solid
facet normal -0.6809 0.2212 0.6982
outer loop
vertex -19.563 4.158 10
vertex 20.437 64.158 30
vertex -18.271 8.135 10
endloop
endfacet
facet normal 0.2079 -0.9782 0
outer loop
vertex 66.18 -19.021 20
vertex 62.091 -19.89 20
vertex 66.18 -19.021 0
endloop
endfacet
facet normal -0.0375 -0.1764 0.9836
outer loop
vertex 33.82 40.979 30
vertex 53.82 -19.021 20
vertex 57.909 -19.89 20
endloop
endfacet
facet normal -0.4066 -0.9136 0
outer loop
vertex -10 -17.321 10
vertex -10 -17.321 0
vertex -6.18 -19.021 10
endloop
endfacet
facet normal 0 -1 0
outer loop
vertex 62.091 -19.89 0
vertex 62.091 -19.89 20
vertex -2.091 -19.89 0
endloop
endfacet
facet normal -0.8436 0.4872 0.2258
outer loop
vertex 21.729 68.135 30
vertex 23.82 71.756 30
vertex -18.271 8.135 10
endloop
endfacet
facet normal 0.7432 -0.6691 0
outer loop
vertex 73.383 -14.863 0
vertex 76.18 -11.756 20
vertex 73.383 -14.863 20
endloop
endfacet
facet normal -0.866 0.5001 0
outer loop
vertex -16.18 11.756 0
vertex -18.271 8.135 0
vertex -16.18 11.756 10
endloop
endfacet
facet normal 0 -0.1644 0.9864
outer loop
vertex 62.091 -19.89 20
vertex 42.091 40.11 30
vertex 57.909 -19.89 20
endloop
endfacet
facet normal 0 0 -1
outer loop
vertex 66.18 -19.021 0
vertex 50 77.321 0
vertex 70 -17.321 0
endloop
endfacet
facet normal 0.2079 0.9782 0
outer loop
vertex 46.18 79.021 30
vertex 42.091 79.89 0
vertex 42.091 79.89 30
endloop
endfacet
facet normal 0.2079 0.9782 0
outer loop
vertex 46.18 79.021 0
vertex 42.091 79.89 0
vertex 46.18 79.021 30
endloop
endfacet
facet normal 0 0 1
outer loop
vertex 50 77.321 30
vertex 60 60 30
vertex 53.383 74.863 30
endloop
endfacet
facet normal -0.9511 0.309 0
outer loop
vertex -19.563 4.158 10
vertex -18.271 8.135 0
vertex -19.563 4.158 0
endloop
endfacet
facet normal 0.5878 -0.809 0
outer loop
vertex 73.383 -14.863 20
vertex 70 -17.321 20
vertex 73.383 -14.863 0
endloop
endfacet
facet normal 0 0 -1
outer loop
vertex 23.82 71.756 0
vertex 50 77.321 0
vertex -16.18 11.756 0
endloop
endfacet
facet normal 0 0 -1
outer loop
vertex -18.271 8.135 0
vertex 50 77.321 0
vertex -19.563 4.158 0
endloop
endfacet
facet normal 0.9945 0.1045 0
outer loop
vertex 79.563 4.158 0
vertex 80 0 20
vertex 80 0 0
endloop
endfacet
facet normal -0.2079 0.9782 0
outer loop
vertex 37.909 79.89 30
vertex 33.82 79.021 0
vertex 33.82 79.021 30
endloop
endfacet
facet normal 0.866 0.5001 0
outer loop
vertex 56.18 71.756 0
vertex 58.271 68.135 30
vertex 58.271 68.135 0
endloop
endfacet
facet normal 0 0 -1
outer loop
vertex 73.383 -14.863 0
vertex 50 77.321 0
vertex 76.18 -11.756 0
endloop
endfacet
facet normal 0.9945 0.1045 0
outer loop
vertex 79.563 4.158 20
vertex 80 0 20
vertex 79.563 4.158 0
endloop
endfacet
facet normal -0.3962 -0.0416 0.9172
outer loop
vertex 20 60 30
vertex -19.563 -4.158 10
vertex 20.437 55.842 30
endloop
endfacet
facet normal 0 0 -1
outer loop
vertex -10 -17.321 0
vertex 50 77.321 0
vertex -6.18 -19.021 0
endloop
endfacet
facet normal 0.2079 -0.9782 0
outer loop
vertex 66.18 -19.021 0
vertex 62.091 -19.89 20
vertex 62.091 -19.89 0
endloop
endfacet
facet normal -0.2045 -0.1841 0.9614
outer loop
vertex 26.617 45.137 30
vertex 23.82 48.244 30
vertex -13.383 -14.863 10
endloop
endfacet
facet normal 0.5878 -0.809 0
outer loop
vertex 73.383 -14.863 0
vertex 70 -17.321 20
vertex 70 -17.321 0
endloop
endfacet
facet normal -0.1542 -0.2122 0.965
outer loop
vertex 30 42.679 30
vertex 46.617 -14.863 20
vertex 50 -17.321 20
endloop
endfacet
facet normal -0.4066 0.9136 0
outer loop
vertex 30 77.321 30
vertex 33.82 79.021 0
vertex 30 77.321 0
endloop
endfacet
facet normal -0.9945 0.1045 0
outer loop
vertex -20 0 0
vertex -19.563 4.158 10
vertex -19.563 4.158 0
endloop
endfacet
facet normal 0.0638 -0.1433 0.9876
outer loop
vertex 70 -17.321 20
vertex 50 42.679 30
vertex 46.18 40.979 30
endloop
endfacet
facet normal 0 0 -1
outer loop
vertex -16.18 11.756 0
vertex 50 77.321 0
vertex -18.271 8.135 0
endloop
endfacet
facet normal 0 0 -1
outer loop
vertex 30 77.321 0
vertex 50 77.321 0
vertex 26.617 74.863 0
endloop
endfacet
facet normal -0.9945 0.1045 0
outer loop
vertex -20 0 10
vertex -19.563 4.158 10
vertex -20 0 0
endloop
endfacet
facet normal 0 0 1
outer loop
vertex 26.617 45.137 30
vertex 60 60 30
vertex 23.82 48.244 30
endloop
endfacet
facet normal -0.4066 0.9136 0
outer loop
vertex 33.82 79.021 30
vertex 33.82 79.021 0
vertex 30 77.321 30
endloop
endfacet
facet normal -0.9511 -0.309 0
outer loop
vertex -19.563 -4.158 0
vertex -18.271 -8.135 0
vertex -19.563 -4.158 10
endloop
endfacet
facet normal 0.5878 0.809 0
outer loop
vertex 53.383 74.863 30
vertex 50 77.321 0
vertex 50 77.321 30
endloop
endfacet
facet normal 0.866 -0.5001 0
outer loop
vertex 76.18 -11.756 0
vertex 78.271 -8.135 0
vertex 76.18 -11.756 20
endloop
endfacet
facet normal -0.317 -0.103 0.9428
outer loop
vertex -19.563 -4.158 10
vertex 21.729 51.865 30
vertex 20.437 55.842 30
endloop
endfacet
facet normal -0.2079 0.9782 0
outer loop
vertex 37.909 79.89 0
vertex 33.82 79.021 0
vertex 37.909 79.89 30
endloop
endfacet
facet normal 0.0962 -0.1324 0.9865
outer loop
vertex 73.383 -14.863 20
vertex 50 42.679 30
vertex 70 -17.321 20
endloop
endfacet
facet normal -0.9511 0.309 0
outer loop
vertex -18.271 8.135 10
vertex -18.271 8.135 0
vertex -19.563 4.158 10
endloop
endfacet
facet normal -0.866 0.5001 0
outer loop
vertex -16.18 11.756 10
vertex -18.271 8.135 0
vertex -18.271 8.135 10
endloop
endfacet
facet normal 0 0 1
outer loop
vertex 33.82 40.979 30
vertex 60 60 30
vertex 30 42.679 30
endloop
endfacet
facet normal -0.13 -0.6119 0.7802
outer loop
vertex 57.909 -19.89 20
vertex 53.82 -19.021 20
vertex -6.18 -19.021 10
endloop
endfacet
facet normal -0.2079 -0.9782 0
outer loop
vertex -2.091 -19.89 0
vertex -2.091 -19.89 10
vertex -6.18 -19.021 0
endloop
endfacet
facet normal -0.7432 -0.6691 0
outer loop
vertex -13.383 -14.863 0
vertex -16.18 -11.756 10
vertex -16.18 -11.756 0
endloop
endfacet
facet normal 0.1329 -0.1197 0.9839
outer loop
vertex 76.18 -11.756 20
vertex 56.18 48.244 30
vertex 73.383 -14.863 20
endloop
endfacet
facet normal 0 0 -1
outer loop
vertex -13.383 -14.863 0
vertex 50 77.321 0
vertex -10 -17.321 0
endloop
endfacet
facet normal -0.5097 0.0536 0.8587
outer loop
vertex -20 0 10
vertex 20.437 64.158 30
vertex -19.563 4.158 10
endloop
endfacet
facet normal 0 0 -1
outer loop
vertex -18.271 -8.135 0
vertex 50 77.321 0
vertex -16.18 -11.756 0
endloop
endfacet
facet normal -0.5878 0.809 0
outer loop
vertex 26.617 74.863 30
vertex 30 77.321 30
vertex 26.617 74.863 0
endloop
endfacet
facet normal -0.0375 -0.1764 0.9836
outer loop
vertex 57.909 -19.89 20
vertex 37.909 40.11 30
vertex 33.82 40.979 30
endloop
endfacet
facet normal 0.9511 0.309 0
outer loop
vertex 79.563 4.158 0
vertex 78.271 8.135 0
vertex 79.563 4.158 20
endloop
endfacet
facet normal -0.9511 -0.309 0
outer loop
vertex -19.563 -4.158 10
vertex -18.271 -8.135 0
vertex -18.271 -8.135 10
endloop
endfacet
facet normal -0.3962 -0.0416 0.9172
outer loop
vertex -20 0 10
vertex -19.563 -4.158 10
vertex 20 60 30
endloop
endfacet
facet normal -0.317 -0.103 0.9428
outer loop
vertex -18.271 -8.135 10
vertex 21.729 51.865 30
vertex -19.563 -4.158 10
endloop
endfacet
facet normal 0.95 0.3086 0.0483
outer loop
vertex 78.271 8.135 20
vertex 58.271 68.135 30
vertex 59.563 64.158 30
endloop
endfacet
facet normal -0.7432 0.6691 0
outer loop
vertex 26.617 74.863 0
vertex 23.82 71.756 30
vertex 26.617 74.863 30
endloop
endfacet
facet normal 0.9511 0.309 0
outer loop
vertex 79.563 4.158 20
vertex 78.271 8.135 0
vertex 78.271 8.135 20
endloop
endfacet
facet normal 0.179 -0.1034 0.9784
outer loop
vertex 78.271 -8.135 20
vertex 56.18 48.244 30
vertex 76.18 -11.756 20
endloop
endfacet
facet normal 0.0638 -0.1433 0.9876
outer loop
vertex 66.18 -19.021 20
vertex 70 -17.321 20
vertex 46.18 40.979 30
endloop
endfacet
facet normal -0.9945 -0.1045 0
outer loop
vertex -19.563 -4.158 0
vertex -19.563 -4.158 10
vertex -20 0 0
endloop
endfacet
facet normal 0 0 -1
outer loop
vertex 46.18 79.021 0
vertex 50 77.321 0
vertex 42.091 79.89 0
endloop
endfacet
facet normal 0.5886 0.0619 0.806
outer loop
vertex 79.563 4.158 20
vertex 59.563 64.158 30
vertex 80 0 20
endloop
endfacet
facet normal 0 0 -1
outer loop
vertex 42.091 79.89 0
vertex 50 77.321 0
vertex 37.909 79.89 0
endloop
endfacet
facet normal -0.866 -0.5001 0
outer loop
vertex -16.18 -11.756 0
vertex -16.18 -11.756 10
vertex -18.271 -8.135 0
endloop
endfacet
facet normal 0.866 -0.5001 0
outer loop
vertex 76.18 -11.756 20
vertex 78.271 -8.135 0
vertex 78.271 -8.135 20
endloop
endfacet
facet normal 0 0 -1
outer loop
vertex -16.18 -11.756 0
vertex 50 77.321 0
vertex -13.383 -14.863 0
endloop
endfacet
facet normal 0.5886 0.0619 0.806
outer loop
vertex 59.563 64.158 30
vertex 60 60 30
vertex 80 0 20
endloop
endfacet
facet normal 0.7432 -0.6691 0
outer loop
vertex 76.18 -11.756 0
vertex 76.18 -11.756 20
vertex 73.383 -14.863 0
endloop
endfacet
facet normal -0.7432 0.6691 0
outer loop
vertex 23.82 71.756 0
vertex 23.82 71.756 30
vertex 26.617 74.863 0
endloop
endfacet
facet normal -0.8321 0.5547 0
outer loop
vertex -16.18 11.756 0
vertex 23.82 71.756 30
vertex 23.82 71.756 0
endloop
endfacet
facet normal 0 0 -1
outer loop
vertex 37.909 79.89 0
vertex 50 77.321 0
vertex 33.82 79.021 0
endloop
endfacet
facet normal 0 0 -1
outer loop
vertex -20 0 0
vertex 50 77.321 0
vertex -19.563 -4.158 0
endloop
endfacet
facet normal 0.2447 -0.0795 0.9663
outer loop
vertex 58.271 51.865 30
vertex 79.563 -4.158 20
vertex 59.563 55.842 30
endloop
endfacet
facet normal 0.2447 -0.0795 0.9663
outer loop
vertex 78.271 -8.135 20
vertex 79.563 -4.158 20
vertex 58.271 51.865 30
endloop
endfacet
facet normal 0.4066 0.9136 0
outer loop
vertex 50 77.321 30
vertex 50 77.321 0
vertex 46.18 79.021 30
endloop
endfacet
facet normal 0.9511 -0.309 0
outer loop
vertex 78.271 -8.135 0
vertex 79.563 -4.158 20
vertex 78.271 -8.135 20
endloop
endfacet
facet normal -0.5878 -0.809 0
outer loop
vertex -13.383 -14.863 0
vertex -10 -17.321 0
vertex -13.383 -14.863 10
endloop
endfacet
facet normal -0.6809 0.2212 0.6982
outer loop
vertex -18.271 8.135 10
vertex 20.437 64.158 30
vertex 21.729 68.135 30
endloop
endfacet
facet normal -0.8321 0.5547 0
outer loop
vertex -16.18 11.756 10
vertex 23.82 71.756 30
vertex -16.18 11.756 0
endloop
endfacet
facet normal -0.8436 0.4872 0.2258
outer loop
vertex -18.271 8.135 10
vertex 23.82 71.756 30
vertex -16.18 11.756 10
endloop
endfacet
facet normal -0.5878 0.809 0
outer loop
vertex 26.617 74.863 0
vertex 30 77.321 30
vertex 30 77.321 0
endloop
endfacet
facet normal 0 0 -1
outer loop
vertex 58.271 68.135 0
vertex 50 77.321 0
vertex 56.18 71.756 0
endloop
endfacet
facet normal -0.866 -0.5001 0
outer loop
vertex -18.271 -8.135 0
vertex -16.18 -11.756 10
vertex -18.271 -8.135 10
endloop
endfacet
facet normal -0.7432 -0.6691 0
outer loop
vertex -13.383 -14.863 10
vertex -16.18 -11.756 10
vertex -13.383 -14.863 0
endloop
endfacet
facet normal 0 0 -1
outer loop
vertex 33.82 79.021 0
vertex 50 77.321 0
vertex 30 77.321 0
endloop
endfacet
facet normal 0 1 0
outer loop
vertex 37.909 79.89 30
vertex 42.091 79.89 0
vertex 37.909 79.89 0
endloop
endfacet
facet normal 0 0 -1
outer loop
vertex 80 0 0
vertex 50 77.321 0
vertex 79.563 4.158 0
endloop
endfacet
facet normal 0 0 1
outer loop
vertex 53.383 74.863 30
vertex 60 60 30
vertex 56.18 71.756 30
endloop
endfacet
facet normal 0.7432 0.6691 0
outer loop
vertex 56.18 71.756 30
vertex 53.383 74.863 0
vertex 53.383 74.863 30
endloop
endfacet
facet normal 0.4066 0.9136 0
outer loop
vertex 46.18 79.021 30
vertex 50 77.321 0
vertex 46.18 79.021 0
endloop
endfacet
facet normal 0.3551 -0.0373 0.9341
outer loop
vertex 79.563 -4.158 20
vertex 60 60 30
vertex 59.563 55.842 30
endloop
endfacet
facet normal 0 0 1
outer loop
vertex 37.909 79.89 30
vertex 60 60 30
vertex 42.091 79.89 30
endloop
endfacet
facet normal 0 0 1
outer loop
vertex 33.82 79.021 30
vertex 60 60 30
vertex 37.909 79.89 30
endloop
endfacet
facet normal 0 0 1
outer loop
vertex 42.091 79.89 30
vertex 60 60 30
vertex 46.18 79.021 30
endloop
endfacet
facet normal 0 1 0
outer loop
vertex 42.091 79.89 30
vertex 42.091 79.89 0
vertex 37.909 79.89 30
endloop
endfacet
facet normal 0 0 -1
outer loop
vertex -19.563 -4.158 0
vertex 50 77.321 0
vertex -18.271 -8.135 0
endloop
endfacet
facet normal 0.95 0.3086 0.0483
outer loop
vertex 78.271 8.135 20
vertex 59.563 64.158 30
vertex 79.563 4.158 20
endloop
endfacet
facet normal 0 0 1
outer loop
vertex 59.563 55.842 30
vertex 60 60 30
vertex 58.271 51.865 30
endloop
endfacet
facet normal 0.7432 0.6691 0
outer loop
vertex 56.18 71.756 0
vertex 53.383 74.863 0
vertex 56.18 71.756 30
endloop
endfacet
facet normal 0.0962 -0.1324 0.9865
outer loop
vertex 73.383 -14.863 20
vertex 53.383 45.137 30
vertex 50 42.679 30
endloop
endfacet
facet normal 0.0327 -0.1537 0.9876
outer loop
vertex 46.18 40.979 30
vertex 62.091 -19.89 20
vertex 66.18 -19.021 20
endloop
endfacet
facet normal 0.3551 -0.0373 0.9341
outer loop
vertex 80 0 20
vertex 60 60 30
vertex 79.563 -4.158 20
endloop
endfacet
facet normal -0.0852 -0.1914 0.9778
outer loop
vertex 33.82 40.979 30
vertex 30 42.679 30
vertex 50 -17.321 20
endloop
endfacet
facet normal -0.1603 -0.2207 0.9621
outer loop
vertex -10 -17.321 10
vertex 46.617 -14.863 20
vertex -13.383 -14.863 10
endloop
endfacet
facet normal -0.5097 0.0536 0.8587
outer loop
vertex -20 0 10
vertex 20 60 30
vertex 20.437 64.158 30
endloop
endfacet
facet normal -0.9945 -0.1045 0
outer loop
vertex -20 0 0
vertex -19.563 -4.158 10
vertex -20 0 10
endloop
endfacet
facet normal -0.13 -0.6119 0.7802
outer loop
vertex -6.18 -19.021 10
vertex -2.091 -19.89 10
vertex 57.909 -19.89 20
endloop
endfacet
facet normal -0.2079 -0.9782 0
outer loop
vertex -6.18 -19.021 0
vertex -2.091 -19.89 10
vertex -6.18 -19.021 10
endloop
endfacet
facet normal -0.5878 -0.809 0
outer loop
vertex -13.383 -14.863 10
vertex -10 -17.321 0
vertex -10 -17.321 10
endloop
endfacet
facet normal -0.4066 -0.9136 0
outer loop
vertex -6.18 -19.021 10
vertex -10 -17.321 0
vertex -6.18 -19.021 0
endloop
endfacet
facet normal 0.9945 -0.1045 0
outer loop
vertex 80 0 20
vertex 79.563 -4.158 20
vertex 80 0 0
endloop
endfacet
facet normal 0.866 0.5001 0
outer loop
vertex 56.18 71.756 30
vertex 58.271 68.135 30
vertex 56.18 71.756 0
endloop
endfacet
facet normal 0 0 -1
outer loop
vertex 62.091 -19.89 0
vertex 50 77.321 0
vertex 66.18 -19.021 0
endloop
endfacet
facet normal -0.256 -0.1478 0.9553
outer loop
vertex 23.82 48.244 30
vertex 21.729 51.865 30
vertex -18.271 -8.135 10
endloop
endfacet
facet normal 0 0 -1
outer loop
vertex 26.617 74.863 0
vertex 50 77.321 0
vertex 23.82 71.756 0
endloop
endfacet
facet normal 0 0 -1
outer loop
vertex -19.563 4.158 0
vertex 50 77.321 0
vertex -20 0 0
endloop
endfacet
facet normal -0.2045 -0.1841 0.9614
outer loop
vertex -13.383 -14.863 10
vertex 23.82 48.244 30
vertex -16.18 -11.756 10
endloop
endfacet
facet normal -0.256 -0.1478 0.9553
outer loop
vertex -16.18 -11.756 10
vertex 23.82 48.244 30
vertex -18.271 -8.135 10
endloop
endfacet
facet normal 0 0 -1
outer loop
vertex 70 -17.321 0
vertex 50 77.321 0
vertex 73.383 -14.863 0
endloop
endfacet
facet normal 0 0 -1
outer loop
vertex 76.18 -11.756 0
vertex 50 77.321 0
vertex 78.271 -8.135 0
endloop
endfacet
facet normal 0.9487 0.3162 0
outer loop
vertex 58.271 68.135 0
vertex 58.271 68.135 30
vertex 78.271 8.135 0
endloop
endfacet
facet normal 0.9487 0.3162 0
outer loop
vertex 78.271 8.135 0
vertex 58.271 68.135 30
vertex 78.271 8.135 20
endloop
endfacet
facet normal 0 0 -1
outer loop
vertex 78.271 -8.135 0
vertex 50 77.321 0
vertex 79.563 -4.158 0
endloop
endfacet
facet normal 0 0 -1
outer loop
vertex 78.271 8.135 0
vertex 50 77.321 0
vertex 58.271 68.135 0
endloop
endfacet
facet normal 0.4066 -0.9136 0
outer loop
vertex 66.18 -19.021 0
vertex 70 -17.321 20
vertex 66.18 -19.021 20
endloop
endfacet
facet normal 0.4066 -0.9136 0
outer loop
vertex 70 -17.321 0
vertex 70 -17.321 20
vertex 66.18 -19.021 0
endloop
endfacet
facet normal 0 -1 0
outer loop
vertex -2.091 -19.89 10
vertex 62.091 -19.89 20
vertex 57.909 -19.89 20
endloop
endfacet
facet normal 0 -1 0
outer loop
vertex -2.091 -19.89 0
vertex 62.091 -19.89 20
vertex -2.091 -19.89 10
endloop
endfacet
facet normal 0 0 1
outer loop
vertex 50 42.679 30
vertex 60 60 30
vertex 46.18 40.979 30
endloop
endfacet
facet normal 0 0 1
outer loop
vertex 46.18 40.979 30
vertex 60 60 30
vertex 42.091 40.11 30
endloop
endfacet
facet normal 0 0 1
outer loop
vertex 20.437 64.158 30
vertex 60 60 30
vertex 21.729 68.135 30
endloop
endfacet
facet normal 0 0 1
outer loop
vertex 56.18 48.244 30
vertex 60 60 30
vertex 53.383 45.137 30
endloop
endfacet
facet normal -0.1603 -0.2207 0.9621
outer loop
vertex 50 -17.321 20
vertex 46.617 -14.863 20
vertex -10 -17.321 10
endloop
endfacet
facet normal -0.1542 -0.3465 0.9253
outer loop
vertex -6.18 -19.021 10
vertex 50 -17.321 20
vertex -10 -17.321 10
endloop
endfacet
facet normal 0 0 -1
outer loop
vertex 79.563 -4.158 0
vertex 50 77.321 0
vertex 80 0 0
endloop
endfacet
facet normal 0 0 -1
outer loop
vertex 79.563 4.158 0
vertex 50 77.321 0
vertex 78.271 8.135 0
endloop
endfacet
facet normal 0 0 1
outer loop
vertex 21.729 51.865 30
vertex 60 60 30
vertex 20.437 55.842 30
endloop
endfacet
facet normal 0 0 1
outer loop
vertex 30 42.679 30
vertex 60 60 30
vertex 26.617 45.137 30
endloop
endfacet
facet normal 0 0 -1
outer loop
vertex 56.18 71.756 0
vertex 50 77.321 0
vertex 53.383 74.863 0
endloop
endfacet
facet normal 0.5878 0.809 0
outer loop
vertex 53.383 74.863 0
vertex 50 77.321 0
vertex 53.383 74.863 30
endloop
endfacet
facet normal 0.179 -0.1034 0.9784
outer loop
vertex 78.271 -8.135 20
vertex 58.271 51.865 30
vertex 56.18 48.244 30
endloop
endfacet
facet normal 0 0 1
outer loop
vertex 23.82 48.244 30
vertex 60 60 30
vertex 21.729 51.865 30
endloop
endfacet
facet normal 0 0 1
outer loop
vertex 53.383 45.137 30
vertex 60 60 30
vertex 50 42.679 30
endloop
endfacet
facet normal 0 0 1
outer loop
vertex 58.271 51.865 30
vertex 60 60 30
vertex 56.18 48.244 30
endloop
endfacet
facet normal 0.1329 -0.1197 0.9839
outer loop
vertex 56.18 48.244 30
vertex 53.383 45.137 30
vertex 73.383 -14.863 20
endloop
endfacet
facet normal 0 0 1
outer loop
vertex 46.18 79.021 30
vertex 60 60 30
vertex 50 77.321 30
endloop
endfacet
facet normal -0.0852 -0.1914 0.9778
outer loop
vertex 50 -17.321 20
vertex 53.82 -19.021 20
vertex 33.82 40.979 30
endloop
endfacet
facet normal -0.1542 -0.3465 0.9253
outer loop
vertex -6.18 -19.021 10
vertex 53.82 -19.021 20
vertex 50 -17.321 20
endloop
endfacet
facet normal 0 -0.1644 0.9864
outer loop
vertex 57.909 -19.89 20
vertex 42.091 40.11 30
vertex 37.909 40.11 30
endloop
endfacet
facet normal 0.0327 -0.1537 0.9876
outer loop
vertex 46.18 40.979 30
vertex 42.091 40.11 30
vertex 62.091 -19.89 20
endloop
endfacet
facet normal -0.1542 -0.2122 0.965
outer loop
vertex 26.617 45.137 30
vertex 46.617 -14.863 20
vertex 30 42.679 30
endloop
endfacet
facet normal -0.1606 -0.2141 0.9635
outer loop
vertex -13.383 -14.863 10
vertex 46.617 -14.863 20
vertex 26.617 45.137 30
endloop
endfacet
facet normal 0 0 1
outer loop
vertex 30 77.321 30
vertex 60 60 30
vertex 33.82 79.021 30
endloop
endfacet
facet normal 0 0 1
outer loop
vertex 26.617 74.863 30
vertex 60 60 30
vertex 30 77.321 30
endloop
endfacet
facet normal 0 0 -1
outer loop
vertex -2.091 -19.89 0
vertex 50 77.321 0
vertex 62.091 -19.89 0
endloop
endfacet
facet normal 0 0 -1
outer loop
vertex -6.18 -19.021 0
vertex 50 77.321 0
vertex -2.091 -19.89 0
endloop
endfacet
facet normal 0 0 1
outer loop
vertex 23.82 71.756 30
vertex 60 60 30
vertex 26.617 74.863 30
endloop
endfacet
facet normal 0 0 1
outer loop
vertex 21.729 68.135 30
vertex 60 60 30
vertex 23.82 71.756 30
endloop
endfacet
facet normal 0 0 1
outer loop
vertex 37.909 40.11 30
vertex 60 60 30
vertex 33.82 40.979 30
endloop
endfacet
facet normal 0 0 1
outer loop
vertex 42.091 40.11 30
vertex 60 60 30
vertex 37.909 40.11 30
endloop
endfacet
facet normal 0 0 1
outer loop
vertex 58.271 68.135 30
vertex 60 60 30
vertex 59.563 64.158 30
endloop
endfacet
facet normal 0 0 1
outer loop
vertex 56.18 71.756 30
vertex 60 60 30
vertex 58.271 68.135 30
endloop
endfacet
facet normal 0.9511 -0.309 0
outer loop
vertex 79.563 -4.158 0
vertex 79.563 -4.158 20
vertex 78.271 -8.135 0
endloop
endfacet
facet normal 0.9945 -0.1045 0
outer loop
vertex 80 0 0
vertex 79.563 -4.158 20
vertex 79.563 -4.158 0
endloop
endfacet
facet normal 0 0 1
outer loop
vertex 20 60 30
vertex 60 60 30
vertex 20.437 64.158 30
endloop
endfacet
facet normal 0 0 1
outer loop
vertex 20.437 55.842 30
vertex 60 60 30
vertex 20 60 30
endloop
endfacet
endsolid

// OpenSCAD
module placa_snowboard(grosime,raza,lungime)
{
cylinder(h=grosime,r=raza);

    x=20;

    translate([lungime-2*raza,0,0]) cylinder(h=grosime,r=raza);
    translate([0,-raza,0])cube([lungime-2*raza,2*raza,grosime]);
}

module placa_snowboard_2(grosime,raza,lungime)
{
    hull(){
        
    cylinder(h=grosime,r=raza);

    x=20;
    translate([lungime-2*raza,0,0]) cylinder(h=grosime,r=raza);
    }   
}
//_____________________________
module placa_podium(grosime,raza,lungime)
{
    hull(){
        
    cylinder(h=grosime,r=raza);

    translate([(lungime-raza)/2,lungime-2*raza,0])cylinder(h=3*grosime,r=raza);
    translate([lungime-2*raza,0,0]) cylinder(h=2*grosime,r=raza);
    }   
}
//_____________________________
//placa_snowboard_2(grosime=10,raza=20,lungime=100);
placa_podium(grosime=10,raza=20,lungime=100);
